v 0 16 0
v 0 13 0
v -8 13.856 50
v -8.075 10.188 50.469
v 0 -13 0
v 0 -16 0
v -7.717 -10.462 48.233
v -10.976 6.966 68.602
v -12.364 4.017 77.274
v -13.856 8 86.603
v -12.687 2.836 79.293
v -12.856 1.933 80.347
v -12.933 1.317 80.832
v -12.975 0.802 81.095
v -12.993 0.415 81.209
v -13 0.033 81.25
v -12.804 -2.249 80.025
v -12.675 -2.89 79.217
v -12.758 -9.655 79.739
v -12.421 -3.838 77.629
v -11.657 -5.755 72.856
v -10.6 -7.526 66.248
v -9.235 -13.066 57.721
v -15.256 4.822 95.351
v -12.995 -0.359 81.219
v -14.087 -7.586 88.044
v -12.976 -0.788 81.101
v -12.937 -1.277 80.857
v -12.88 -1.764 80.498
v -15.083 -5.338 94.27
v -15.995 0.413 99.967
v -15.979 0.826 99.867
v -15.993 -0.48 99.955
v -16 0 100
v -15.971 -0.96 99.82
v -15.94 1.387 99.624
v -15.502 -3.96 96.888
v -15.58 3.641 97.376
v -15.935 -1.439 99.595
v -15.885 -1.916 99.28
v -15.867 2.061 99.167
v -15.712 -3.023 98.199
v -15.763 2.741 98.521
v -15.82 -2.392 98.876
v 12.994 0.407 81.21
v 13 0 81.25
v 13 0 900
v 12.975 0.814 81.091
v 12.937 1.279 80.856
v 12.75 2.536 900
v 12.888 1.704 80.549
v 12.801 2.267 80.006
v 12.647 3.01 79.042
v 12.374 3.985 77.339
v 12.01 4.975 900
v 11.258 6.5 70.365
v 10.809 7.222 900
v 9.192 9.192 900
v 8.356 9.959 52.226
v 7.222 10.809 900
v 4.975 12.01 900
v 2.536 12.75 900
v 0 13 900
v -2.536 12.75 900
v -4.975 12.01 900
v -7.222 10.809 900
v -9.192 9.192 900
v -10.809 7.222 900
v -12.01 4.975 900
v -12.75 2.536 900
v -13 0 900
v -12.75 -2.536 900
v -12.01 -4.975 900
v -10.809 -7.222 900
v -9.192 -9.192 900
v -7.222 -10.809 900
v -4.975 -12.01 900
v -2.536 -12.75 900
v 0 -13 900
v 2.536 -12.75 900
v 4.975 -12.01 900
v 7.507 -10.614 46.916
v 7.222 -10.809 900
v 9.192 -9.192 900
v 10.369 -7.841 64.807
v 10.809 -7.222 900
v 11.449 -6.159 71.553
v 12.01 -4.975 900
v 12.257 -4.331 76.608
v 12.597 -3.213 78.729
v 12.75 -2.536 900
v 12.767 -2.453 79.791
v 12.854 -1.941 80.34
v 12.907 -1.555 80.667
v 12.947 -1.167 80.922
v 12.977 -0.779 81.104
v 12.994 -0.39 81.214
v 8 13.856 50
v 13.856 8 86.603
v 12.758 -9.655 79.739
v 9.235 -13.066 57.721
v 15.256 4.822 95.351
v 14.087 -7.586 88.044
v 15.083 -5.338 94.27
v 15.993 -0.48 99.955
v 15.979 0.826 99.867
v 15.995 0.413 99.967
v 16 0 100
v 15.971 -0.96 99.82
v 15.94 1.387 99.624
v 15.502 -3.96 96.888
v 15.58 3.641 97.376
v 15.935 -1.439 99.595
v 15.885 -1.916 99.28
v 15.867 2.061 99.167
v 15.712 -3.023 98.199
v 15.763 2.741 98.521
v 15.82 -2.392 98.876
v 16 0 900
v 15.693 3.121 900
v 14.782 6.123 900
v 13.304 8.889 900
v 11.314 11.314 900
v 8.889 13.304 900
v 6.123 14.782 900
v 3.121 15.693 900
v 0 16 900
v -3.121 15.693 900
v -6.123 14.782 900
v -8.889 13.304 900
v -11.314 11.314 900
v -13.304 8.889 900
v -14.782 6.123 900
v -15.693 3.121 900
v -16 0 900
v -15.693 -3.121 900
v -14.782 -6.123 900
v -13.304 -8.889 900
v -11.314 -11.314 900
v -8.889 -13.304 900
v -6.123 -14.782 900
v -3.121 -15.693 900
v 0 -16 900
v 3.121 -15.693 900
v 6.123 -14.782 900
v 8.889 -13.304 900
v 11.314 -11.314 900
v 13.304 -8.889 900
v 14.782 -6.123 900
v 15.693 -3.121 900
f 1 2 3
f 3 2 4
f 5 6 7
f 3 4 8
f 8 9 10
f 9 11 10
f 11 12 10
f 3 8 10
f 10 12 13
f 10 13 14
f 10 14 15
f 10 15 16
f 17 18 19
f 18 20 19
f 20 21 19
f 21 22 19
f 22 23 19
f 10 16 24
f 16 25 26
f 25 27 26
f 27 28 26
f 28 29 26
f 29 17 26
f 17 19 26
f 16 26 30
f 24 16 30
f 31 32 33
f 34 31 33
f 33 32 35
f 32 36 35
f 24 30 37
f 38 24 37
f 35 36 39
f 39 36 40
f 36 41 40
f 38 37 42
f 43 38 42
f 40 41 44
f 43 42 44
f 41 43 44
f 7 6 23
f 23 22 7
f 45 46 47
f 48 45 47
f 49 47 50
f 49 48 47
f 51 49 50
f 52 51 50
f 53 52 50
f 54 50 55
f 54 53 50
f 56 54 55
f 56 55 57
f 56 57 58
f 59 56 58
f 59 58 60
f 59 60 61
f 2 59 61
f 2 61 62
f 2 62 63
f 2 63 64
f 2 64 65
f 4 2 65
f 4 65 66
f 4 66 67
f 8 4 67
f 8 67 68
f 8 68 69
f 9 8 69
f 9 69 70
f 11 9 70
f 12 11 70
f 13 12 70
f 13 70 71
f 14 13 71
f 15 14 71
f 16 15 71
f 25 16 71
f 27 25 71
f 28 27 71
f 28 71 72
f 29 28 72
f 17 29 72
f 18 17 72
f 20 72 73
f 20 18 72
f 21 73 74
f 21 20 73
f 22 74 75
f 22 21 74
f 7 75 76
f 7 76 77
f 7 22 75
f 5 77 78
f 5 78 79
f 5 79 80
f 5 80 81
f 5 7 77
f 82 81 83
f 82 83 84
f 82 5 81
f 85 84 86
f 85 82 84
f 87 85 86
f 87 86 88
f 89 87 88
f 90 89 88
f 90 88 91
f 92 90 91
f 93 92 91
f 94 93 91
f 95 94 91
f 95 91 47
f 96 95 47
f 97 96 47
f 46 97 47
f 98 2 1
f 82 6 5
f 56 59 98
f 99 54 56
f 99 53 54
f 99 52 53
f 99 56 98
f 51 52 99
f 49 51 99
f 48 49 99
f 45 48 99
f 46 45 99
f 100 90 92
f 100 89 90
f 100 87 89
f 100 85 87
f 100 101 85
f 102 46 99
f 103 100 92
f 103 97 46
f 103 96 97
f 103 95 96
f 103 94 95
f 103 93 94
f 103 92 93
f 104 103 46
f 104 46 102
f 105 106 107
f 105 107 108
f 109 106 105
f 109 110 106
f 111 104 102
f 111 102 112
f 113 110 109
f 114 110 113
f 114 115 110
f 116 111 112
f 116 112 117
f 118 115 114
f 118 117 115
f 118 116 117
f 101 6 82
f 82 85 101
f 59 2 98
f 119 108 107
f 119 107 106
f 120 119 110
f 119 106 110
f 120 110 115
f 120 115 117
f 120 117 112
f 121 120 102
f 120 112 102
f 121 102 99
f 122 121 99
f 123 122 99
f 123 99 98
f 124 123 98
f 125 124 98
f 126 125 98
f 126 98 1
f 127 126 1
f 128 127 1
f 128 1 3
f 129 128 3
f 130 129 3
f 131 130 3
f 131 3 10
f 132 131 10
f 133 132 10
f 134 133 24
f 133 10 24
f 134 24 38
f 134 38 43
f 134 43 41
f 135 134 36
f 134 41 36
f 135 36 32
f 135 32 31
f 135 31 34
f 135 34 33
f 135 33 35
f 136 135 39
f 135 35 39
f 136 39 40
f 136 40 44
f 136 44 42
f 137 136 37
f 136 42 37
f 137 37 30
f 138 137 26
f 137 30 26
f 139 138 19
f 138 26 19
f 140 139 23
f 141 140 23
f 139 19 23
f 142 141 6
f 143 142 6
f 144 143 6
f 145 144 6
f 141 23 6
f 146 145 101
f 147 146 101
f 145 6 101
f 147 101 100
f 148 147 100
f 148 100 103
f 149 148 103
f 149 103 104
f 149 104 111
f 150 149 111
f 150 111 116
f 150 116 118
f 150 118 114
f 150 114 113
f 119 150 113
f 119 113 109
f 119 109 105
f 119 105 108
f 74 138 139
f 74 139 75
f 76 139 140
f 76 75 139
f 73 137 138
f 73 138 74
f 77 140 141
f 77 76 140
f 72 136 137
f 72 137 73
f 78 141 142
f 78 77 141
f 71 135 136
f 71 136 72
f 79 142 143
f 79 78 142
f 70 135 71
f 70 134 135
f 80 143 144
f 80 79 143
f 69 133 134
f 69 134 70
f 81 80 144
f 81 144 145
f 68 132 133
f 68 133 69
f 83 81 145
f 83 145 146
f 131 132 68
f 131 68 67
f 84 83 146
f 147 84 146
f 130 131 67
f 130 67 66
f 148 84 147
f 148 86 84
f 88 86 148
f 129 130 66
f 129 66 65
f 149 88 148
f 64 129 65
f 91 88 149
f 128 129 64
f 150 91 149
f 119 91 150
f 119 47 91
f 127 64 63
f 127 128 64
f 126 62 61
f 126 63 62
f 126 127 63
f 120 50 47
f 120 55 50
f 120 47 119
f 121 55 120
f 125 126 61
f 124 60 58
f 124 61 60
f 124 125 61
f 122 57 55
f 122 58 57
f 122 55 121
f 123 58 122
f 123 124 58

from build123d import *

# Parameters (mm, degrees)
ESQUISSE1_R                  = 16
ESQUISSE1_R_2                = 13
BOSS_EXTRU_1_DEPTH           = 900
ENL_V_MAT_EXTRU_1_DEPTH      = 901.284399509
ENL_V_MAT_EXTRU_1_DEPTH_BACK = 901.284399509
ENL_V_MAT_EXTRU_2_DEPTH      = 901.284399509
ENL_V_MAT_EXTRU_2_DEPTH_BACK = 901.284399509


with BuildPart() as part:
    # Esquisse1 → Boss.-Extru.1 (new body)
    with BuildSketch(Plane.XY):
        Circle(ESQUISSE1_R)
        Circle(ESQUISSE1_R_2, mode=Mode.SUBTRACT)
    extrude(amount=BOSS_EXTRU_1_DEPTH)

    # Esquisse2 → Enlèv. mat.-Extru.1 (cut, two sides: drawn at the far end of the back side and taken through both)
    with BuildSketch(Plane(origin=(0, 0, 0), x_dir=(1, 0, 0), z_dir=(0, 1, 0)).offset(-ENL_V_MAT_EXTRU_1_DEPTH_BACK)):
        Polygon((0, 0), (16, -100), (16, 0), align=None)
    extrude(amount=ENL_V_MAT_EXTRU_1_DEPTH + ENL_V_MAT_EXTRU_1_DEPTH_BACK, mode=Mode.SUBTRACT)

    # Esquisse3 → Enlèv. mat.-Extru.2 (cut, two sides: drawn at the far end of the back side and taken through both)
    with BuildSketch(Plane(origin=(0, 0, 0), x_dir=(1, 0, 0), z_dir=(0, 1, 0)).offset(-ENL_V_MAT_EXTRU_2_DEPTH_BACK)):
        Polygon((0, 0), (-16, -100), (-16, 0), align=None)
    extrude(amount=ENL_V_MAT_EXTRU_2_DEPTH + ENL_V_MAT_EXTRU_2_DEPTH_BACK, mode=Mode.SUBTRACT)


solid = part.part
